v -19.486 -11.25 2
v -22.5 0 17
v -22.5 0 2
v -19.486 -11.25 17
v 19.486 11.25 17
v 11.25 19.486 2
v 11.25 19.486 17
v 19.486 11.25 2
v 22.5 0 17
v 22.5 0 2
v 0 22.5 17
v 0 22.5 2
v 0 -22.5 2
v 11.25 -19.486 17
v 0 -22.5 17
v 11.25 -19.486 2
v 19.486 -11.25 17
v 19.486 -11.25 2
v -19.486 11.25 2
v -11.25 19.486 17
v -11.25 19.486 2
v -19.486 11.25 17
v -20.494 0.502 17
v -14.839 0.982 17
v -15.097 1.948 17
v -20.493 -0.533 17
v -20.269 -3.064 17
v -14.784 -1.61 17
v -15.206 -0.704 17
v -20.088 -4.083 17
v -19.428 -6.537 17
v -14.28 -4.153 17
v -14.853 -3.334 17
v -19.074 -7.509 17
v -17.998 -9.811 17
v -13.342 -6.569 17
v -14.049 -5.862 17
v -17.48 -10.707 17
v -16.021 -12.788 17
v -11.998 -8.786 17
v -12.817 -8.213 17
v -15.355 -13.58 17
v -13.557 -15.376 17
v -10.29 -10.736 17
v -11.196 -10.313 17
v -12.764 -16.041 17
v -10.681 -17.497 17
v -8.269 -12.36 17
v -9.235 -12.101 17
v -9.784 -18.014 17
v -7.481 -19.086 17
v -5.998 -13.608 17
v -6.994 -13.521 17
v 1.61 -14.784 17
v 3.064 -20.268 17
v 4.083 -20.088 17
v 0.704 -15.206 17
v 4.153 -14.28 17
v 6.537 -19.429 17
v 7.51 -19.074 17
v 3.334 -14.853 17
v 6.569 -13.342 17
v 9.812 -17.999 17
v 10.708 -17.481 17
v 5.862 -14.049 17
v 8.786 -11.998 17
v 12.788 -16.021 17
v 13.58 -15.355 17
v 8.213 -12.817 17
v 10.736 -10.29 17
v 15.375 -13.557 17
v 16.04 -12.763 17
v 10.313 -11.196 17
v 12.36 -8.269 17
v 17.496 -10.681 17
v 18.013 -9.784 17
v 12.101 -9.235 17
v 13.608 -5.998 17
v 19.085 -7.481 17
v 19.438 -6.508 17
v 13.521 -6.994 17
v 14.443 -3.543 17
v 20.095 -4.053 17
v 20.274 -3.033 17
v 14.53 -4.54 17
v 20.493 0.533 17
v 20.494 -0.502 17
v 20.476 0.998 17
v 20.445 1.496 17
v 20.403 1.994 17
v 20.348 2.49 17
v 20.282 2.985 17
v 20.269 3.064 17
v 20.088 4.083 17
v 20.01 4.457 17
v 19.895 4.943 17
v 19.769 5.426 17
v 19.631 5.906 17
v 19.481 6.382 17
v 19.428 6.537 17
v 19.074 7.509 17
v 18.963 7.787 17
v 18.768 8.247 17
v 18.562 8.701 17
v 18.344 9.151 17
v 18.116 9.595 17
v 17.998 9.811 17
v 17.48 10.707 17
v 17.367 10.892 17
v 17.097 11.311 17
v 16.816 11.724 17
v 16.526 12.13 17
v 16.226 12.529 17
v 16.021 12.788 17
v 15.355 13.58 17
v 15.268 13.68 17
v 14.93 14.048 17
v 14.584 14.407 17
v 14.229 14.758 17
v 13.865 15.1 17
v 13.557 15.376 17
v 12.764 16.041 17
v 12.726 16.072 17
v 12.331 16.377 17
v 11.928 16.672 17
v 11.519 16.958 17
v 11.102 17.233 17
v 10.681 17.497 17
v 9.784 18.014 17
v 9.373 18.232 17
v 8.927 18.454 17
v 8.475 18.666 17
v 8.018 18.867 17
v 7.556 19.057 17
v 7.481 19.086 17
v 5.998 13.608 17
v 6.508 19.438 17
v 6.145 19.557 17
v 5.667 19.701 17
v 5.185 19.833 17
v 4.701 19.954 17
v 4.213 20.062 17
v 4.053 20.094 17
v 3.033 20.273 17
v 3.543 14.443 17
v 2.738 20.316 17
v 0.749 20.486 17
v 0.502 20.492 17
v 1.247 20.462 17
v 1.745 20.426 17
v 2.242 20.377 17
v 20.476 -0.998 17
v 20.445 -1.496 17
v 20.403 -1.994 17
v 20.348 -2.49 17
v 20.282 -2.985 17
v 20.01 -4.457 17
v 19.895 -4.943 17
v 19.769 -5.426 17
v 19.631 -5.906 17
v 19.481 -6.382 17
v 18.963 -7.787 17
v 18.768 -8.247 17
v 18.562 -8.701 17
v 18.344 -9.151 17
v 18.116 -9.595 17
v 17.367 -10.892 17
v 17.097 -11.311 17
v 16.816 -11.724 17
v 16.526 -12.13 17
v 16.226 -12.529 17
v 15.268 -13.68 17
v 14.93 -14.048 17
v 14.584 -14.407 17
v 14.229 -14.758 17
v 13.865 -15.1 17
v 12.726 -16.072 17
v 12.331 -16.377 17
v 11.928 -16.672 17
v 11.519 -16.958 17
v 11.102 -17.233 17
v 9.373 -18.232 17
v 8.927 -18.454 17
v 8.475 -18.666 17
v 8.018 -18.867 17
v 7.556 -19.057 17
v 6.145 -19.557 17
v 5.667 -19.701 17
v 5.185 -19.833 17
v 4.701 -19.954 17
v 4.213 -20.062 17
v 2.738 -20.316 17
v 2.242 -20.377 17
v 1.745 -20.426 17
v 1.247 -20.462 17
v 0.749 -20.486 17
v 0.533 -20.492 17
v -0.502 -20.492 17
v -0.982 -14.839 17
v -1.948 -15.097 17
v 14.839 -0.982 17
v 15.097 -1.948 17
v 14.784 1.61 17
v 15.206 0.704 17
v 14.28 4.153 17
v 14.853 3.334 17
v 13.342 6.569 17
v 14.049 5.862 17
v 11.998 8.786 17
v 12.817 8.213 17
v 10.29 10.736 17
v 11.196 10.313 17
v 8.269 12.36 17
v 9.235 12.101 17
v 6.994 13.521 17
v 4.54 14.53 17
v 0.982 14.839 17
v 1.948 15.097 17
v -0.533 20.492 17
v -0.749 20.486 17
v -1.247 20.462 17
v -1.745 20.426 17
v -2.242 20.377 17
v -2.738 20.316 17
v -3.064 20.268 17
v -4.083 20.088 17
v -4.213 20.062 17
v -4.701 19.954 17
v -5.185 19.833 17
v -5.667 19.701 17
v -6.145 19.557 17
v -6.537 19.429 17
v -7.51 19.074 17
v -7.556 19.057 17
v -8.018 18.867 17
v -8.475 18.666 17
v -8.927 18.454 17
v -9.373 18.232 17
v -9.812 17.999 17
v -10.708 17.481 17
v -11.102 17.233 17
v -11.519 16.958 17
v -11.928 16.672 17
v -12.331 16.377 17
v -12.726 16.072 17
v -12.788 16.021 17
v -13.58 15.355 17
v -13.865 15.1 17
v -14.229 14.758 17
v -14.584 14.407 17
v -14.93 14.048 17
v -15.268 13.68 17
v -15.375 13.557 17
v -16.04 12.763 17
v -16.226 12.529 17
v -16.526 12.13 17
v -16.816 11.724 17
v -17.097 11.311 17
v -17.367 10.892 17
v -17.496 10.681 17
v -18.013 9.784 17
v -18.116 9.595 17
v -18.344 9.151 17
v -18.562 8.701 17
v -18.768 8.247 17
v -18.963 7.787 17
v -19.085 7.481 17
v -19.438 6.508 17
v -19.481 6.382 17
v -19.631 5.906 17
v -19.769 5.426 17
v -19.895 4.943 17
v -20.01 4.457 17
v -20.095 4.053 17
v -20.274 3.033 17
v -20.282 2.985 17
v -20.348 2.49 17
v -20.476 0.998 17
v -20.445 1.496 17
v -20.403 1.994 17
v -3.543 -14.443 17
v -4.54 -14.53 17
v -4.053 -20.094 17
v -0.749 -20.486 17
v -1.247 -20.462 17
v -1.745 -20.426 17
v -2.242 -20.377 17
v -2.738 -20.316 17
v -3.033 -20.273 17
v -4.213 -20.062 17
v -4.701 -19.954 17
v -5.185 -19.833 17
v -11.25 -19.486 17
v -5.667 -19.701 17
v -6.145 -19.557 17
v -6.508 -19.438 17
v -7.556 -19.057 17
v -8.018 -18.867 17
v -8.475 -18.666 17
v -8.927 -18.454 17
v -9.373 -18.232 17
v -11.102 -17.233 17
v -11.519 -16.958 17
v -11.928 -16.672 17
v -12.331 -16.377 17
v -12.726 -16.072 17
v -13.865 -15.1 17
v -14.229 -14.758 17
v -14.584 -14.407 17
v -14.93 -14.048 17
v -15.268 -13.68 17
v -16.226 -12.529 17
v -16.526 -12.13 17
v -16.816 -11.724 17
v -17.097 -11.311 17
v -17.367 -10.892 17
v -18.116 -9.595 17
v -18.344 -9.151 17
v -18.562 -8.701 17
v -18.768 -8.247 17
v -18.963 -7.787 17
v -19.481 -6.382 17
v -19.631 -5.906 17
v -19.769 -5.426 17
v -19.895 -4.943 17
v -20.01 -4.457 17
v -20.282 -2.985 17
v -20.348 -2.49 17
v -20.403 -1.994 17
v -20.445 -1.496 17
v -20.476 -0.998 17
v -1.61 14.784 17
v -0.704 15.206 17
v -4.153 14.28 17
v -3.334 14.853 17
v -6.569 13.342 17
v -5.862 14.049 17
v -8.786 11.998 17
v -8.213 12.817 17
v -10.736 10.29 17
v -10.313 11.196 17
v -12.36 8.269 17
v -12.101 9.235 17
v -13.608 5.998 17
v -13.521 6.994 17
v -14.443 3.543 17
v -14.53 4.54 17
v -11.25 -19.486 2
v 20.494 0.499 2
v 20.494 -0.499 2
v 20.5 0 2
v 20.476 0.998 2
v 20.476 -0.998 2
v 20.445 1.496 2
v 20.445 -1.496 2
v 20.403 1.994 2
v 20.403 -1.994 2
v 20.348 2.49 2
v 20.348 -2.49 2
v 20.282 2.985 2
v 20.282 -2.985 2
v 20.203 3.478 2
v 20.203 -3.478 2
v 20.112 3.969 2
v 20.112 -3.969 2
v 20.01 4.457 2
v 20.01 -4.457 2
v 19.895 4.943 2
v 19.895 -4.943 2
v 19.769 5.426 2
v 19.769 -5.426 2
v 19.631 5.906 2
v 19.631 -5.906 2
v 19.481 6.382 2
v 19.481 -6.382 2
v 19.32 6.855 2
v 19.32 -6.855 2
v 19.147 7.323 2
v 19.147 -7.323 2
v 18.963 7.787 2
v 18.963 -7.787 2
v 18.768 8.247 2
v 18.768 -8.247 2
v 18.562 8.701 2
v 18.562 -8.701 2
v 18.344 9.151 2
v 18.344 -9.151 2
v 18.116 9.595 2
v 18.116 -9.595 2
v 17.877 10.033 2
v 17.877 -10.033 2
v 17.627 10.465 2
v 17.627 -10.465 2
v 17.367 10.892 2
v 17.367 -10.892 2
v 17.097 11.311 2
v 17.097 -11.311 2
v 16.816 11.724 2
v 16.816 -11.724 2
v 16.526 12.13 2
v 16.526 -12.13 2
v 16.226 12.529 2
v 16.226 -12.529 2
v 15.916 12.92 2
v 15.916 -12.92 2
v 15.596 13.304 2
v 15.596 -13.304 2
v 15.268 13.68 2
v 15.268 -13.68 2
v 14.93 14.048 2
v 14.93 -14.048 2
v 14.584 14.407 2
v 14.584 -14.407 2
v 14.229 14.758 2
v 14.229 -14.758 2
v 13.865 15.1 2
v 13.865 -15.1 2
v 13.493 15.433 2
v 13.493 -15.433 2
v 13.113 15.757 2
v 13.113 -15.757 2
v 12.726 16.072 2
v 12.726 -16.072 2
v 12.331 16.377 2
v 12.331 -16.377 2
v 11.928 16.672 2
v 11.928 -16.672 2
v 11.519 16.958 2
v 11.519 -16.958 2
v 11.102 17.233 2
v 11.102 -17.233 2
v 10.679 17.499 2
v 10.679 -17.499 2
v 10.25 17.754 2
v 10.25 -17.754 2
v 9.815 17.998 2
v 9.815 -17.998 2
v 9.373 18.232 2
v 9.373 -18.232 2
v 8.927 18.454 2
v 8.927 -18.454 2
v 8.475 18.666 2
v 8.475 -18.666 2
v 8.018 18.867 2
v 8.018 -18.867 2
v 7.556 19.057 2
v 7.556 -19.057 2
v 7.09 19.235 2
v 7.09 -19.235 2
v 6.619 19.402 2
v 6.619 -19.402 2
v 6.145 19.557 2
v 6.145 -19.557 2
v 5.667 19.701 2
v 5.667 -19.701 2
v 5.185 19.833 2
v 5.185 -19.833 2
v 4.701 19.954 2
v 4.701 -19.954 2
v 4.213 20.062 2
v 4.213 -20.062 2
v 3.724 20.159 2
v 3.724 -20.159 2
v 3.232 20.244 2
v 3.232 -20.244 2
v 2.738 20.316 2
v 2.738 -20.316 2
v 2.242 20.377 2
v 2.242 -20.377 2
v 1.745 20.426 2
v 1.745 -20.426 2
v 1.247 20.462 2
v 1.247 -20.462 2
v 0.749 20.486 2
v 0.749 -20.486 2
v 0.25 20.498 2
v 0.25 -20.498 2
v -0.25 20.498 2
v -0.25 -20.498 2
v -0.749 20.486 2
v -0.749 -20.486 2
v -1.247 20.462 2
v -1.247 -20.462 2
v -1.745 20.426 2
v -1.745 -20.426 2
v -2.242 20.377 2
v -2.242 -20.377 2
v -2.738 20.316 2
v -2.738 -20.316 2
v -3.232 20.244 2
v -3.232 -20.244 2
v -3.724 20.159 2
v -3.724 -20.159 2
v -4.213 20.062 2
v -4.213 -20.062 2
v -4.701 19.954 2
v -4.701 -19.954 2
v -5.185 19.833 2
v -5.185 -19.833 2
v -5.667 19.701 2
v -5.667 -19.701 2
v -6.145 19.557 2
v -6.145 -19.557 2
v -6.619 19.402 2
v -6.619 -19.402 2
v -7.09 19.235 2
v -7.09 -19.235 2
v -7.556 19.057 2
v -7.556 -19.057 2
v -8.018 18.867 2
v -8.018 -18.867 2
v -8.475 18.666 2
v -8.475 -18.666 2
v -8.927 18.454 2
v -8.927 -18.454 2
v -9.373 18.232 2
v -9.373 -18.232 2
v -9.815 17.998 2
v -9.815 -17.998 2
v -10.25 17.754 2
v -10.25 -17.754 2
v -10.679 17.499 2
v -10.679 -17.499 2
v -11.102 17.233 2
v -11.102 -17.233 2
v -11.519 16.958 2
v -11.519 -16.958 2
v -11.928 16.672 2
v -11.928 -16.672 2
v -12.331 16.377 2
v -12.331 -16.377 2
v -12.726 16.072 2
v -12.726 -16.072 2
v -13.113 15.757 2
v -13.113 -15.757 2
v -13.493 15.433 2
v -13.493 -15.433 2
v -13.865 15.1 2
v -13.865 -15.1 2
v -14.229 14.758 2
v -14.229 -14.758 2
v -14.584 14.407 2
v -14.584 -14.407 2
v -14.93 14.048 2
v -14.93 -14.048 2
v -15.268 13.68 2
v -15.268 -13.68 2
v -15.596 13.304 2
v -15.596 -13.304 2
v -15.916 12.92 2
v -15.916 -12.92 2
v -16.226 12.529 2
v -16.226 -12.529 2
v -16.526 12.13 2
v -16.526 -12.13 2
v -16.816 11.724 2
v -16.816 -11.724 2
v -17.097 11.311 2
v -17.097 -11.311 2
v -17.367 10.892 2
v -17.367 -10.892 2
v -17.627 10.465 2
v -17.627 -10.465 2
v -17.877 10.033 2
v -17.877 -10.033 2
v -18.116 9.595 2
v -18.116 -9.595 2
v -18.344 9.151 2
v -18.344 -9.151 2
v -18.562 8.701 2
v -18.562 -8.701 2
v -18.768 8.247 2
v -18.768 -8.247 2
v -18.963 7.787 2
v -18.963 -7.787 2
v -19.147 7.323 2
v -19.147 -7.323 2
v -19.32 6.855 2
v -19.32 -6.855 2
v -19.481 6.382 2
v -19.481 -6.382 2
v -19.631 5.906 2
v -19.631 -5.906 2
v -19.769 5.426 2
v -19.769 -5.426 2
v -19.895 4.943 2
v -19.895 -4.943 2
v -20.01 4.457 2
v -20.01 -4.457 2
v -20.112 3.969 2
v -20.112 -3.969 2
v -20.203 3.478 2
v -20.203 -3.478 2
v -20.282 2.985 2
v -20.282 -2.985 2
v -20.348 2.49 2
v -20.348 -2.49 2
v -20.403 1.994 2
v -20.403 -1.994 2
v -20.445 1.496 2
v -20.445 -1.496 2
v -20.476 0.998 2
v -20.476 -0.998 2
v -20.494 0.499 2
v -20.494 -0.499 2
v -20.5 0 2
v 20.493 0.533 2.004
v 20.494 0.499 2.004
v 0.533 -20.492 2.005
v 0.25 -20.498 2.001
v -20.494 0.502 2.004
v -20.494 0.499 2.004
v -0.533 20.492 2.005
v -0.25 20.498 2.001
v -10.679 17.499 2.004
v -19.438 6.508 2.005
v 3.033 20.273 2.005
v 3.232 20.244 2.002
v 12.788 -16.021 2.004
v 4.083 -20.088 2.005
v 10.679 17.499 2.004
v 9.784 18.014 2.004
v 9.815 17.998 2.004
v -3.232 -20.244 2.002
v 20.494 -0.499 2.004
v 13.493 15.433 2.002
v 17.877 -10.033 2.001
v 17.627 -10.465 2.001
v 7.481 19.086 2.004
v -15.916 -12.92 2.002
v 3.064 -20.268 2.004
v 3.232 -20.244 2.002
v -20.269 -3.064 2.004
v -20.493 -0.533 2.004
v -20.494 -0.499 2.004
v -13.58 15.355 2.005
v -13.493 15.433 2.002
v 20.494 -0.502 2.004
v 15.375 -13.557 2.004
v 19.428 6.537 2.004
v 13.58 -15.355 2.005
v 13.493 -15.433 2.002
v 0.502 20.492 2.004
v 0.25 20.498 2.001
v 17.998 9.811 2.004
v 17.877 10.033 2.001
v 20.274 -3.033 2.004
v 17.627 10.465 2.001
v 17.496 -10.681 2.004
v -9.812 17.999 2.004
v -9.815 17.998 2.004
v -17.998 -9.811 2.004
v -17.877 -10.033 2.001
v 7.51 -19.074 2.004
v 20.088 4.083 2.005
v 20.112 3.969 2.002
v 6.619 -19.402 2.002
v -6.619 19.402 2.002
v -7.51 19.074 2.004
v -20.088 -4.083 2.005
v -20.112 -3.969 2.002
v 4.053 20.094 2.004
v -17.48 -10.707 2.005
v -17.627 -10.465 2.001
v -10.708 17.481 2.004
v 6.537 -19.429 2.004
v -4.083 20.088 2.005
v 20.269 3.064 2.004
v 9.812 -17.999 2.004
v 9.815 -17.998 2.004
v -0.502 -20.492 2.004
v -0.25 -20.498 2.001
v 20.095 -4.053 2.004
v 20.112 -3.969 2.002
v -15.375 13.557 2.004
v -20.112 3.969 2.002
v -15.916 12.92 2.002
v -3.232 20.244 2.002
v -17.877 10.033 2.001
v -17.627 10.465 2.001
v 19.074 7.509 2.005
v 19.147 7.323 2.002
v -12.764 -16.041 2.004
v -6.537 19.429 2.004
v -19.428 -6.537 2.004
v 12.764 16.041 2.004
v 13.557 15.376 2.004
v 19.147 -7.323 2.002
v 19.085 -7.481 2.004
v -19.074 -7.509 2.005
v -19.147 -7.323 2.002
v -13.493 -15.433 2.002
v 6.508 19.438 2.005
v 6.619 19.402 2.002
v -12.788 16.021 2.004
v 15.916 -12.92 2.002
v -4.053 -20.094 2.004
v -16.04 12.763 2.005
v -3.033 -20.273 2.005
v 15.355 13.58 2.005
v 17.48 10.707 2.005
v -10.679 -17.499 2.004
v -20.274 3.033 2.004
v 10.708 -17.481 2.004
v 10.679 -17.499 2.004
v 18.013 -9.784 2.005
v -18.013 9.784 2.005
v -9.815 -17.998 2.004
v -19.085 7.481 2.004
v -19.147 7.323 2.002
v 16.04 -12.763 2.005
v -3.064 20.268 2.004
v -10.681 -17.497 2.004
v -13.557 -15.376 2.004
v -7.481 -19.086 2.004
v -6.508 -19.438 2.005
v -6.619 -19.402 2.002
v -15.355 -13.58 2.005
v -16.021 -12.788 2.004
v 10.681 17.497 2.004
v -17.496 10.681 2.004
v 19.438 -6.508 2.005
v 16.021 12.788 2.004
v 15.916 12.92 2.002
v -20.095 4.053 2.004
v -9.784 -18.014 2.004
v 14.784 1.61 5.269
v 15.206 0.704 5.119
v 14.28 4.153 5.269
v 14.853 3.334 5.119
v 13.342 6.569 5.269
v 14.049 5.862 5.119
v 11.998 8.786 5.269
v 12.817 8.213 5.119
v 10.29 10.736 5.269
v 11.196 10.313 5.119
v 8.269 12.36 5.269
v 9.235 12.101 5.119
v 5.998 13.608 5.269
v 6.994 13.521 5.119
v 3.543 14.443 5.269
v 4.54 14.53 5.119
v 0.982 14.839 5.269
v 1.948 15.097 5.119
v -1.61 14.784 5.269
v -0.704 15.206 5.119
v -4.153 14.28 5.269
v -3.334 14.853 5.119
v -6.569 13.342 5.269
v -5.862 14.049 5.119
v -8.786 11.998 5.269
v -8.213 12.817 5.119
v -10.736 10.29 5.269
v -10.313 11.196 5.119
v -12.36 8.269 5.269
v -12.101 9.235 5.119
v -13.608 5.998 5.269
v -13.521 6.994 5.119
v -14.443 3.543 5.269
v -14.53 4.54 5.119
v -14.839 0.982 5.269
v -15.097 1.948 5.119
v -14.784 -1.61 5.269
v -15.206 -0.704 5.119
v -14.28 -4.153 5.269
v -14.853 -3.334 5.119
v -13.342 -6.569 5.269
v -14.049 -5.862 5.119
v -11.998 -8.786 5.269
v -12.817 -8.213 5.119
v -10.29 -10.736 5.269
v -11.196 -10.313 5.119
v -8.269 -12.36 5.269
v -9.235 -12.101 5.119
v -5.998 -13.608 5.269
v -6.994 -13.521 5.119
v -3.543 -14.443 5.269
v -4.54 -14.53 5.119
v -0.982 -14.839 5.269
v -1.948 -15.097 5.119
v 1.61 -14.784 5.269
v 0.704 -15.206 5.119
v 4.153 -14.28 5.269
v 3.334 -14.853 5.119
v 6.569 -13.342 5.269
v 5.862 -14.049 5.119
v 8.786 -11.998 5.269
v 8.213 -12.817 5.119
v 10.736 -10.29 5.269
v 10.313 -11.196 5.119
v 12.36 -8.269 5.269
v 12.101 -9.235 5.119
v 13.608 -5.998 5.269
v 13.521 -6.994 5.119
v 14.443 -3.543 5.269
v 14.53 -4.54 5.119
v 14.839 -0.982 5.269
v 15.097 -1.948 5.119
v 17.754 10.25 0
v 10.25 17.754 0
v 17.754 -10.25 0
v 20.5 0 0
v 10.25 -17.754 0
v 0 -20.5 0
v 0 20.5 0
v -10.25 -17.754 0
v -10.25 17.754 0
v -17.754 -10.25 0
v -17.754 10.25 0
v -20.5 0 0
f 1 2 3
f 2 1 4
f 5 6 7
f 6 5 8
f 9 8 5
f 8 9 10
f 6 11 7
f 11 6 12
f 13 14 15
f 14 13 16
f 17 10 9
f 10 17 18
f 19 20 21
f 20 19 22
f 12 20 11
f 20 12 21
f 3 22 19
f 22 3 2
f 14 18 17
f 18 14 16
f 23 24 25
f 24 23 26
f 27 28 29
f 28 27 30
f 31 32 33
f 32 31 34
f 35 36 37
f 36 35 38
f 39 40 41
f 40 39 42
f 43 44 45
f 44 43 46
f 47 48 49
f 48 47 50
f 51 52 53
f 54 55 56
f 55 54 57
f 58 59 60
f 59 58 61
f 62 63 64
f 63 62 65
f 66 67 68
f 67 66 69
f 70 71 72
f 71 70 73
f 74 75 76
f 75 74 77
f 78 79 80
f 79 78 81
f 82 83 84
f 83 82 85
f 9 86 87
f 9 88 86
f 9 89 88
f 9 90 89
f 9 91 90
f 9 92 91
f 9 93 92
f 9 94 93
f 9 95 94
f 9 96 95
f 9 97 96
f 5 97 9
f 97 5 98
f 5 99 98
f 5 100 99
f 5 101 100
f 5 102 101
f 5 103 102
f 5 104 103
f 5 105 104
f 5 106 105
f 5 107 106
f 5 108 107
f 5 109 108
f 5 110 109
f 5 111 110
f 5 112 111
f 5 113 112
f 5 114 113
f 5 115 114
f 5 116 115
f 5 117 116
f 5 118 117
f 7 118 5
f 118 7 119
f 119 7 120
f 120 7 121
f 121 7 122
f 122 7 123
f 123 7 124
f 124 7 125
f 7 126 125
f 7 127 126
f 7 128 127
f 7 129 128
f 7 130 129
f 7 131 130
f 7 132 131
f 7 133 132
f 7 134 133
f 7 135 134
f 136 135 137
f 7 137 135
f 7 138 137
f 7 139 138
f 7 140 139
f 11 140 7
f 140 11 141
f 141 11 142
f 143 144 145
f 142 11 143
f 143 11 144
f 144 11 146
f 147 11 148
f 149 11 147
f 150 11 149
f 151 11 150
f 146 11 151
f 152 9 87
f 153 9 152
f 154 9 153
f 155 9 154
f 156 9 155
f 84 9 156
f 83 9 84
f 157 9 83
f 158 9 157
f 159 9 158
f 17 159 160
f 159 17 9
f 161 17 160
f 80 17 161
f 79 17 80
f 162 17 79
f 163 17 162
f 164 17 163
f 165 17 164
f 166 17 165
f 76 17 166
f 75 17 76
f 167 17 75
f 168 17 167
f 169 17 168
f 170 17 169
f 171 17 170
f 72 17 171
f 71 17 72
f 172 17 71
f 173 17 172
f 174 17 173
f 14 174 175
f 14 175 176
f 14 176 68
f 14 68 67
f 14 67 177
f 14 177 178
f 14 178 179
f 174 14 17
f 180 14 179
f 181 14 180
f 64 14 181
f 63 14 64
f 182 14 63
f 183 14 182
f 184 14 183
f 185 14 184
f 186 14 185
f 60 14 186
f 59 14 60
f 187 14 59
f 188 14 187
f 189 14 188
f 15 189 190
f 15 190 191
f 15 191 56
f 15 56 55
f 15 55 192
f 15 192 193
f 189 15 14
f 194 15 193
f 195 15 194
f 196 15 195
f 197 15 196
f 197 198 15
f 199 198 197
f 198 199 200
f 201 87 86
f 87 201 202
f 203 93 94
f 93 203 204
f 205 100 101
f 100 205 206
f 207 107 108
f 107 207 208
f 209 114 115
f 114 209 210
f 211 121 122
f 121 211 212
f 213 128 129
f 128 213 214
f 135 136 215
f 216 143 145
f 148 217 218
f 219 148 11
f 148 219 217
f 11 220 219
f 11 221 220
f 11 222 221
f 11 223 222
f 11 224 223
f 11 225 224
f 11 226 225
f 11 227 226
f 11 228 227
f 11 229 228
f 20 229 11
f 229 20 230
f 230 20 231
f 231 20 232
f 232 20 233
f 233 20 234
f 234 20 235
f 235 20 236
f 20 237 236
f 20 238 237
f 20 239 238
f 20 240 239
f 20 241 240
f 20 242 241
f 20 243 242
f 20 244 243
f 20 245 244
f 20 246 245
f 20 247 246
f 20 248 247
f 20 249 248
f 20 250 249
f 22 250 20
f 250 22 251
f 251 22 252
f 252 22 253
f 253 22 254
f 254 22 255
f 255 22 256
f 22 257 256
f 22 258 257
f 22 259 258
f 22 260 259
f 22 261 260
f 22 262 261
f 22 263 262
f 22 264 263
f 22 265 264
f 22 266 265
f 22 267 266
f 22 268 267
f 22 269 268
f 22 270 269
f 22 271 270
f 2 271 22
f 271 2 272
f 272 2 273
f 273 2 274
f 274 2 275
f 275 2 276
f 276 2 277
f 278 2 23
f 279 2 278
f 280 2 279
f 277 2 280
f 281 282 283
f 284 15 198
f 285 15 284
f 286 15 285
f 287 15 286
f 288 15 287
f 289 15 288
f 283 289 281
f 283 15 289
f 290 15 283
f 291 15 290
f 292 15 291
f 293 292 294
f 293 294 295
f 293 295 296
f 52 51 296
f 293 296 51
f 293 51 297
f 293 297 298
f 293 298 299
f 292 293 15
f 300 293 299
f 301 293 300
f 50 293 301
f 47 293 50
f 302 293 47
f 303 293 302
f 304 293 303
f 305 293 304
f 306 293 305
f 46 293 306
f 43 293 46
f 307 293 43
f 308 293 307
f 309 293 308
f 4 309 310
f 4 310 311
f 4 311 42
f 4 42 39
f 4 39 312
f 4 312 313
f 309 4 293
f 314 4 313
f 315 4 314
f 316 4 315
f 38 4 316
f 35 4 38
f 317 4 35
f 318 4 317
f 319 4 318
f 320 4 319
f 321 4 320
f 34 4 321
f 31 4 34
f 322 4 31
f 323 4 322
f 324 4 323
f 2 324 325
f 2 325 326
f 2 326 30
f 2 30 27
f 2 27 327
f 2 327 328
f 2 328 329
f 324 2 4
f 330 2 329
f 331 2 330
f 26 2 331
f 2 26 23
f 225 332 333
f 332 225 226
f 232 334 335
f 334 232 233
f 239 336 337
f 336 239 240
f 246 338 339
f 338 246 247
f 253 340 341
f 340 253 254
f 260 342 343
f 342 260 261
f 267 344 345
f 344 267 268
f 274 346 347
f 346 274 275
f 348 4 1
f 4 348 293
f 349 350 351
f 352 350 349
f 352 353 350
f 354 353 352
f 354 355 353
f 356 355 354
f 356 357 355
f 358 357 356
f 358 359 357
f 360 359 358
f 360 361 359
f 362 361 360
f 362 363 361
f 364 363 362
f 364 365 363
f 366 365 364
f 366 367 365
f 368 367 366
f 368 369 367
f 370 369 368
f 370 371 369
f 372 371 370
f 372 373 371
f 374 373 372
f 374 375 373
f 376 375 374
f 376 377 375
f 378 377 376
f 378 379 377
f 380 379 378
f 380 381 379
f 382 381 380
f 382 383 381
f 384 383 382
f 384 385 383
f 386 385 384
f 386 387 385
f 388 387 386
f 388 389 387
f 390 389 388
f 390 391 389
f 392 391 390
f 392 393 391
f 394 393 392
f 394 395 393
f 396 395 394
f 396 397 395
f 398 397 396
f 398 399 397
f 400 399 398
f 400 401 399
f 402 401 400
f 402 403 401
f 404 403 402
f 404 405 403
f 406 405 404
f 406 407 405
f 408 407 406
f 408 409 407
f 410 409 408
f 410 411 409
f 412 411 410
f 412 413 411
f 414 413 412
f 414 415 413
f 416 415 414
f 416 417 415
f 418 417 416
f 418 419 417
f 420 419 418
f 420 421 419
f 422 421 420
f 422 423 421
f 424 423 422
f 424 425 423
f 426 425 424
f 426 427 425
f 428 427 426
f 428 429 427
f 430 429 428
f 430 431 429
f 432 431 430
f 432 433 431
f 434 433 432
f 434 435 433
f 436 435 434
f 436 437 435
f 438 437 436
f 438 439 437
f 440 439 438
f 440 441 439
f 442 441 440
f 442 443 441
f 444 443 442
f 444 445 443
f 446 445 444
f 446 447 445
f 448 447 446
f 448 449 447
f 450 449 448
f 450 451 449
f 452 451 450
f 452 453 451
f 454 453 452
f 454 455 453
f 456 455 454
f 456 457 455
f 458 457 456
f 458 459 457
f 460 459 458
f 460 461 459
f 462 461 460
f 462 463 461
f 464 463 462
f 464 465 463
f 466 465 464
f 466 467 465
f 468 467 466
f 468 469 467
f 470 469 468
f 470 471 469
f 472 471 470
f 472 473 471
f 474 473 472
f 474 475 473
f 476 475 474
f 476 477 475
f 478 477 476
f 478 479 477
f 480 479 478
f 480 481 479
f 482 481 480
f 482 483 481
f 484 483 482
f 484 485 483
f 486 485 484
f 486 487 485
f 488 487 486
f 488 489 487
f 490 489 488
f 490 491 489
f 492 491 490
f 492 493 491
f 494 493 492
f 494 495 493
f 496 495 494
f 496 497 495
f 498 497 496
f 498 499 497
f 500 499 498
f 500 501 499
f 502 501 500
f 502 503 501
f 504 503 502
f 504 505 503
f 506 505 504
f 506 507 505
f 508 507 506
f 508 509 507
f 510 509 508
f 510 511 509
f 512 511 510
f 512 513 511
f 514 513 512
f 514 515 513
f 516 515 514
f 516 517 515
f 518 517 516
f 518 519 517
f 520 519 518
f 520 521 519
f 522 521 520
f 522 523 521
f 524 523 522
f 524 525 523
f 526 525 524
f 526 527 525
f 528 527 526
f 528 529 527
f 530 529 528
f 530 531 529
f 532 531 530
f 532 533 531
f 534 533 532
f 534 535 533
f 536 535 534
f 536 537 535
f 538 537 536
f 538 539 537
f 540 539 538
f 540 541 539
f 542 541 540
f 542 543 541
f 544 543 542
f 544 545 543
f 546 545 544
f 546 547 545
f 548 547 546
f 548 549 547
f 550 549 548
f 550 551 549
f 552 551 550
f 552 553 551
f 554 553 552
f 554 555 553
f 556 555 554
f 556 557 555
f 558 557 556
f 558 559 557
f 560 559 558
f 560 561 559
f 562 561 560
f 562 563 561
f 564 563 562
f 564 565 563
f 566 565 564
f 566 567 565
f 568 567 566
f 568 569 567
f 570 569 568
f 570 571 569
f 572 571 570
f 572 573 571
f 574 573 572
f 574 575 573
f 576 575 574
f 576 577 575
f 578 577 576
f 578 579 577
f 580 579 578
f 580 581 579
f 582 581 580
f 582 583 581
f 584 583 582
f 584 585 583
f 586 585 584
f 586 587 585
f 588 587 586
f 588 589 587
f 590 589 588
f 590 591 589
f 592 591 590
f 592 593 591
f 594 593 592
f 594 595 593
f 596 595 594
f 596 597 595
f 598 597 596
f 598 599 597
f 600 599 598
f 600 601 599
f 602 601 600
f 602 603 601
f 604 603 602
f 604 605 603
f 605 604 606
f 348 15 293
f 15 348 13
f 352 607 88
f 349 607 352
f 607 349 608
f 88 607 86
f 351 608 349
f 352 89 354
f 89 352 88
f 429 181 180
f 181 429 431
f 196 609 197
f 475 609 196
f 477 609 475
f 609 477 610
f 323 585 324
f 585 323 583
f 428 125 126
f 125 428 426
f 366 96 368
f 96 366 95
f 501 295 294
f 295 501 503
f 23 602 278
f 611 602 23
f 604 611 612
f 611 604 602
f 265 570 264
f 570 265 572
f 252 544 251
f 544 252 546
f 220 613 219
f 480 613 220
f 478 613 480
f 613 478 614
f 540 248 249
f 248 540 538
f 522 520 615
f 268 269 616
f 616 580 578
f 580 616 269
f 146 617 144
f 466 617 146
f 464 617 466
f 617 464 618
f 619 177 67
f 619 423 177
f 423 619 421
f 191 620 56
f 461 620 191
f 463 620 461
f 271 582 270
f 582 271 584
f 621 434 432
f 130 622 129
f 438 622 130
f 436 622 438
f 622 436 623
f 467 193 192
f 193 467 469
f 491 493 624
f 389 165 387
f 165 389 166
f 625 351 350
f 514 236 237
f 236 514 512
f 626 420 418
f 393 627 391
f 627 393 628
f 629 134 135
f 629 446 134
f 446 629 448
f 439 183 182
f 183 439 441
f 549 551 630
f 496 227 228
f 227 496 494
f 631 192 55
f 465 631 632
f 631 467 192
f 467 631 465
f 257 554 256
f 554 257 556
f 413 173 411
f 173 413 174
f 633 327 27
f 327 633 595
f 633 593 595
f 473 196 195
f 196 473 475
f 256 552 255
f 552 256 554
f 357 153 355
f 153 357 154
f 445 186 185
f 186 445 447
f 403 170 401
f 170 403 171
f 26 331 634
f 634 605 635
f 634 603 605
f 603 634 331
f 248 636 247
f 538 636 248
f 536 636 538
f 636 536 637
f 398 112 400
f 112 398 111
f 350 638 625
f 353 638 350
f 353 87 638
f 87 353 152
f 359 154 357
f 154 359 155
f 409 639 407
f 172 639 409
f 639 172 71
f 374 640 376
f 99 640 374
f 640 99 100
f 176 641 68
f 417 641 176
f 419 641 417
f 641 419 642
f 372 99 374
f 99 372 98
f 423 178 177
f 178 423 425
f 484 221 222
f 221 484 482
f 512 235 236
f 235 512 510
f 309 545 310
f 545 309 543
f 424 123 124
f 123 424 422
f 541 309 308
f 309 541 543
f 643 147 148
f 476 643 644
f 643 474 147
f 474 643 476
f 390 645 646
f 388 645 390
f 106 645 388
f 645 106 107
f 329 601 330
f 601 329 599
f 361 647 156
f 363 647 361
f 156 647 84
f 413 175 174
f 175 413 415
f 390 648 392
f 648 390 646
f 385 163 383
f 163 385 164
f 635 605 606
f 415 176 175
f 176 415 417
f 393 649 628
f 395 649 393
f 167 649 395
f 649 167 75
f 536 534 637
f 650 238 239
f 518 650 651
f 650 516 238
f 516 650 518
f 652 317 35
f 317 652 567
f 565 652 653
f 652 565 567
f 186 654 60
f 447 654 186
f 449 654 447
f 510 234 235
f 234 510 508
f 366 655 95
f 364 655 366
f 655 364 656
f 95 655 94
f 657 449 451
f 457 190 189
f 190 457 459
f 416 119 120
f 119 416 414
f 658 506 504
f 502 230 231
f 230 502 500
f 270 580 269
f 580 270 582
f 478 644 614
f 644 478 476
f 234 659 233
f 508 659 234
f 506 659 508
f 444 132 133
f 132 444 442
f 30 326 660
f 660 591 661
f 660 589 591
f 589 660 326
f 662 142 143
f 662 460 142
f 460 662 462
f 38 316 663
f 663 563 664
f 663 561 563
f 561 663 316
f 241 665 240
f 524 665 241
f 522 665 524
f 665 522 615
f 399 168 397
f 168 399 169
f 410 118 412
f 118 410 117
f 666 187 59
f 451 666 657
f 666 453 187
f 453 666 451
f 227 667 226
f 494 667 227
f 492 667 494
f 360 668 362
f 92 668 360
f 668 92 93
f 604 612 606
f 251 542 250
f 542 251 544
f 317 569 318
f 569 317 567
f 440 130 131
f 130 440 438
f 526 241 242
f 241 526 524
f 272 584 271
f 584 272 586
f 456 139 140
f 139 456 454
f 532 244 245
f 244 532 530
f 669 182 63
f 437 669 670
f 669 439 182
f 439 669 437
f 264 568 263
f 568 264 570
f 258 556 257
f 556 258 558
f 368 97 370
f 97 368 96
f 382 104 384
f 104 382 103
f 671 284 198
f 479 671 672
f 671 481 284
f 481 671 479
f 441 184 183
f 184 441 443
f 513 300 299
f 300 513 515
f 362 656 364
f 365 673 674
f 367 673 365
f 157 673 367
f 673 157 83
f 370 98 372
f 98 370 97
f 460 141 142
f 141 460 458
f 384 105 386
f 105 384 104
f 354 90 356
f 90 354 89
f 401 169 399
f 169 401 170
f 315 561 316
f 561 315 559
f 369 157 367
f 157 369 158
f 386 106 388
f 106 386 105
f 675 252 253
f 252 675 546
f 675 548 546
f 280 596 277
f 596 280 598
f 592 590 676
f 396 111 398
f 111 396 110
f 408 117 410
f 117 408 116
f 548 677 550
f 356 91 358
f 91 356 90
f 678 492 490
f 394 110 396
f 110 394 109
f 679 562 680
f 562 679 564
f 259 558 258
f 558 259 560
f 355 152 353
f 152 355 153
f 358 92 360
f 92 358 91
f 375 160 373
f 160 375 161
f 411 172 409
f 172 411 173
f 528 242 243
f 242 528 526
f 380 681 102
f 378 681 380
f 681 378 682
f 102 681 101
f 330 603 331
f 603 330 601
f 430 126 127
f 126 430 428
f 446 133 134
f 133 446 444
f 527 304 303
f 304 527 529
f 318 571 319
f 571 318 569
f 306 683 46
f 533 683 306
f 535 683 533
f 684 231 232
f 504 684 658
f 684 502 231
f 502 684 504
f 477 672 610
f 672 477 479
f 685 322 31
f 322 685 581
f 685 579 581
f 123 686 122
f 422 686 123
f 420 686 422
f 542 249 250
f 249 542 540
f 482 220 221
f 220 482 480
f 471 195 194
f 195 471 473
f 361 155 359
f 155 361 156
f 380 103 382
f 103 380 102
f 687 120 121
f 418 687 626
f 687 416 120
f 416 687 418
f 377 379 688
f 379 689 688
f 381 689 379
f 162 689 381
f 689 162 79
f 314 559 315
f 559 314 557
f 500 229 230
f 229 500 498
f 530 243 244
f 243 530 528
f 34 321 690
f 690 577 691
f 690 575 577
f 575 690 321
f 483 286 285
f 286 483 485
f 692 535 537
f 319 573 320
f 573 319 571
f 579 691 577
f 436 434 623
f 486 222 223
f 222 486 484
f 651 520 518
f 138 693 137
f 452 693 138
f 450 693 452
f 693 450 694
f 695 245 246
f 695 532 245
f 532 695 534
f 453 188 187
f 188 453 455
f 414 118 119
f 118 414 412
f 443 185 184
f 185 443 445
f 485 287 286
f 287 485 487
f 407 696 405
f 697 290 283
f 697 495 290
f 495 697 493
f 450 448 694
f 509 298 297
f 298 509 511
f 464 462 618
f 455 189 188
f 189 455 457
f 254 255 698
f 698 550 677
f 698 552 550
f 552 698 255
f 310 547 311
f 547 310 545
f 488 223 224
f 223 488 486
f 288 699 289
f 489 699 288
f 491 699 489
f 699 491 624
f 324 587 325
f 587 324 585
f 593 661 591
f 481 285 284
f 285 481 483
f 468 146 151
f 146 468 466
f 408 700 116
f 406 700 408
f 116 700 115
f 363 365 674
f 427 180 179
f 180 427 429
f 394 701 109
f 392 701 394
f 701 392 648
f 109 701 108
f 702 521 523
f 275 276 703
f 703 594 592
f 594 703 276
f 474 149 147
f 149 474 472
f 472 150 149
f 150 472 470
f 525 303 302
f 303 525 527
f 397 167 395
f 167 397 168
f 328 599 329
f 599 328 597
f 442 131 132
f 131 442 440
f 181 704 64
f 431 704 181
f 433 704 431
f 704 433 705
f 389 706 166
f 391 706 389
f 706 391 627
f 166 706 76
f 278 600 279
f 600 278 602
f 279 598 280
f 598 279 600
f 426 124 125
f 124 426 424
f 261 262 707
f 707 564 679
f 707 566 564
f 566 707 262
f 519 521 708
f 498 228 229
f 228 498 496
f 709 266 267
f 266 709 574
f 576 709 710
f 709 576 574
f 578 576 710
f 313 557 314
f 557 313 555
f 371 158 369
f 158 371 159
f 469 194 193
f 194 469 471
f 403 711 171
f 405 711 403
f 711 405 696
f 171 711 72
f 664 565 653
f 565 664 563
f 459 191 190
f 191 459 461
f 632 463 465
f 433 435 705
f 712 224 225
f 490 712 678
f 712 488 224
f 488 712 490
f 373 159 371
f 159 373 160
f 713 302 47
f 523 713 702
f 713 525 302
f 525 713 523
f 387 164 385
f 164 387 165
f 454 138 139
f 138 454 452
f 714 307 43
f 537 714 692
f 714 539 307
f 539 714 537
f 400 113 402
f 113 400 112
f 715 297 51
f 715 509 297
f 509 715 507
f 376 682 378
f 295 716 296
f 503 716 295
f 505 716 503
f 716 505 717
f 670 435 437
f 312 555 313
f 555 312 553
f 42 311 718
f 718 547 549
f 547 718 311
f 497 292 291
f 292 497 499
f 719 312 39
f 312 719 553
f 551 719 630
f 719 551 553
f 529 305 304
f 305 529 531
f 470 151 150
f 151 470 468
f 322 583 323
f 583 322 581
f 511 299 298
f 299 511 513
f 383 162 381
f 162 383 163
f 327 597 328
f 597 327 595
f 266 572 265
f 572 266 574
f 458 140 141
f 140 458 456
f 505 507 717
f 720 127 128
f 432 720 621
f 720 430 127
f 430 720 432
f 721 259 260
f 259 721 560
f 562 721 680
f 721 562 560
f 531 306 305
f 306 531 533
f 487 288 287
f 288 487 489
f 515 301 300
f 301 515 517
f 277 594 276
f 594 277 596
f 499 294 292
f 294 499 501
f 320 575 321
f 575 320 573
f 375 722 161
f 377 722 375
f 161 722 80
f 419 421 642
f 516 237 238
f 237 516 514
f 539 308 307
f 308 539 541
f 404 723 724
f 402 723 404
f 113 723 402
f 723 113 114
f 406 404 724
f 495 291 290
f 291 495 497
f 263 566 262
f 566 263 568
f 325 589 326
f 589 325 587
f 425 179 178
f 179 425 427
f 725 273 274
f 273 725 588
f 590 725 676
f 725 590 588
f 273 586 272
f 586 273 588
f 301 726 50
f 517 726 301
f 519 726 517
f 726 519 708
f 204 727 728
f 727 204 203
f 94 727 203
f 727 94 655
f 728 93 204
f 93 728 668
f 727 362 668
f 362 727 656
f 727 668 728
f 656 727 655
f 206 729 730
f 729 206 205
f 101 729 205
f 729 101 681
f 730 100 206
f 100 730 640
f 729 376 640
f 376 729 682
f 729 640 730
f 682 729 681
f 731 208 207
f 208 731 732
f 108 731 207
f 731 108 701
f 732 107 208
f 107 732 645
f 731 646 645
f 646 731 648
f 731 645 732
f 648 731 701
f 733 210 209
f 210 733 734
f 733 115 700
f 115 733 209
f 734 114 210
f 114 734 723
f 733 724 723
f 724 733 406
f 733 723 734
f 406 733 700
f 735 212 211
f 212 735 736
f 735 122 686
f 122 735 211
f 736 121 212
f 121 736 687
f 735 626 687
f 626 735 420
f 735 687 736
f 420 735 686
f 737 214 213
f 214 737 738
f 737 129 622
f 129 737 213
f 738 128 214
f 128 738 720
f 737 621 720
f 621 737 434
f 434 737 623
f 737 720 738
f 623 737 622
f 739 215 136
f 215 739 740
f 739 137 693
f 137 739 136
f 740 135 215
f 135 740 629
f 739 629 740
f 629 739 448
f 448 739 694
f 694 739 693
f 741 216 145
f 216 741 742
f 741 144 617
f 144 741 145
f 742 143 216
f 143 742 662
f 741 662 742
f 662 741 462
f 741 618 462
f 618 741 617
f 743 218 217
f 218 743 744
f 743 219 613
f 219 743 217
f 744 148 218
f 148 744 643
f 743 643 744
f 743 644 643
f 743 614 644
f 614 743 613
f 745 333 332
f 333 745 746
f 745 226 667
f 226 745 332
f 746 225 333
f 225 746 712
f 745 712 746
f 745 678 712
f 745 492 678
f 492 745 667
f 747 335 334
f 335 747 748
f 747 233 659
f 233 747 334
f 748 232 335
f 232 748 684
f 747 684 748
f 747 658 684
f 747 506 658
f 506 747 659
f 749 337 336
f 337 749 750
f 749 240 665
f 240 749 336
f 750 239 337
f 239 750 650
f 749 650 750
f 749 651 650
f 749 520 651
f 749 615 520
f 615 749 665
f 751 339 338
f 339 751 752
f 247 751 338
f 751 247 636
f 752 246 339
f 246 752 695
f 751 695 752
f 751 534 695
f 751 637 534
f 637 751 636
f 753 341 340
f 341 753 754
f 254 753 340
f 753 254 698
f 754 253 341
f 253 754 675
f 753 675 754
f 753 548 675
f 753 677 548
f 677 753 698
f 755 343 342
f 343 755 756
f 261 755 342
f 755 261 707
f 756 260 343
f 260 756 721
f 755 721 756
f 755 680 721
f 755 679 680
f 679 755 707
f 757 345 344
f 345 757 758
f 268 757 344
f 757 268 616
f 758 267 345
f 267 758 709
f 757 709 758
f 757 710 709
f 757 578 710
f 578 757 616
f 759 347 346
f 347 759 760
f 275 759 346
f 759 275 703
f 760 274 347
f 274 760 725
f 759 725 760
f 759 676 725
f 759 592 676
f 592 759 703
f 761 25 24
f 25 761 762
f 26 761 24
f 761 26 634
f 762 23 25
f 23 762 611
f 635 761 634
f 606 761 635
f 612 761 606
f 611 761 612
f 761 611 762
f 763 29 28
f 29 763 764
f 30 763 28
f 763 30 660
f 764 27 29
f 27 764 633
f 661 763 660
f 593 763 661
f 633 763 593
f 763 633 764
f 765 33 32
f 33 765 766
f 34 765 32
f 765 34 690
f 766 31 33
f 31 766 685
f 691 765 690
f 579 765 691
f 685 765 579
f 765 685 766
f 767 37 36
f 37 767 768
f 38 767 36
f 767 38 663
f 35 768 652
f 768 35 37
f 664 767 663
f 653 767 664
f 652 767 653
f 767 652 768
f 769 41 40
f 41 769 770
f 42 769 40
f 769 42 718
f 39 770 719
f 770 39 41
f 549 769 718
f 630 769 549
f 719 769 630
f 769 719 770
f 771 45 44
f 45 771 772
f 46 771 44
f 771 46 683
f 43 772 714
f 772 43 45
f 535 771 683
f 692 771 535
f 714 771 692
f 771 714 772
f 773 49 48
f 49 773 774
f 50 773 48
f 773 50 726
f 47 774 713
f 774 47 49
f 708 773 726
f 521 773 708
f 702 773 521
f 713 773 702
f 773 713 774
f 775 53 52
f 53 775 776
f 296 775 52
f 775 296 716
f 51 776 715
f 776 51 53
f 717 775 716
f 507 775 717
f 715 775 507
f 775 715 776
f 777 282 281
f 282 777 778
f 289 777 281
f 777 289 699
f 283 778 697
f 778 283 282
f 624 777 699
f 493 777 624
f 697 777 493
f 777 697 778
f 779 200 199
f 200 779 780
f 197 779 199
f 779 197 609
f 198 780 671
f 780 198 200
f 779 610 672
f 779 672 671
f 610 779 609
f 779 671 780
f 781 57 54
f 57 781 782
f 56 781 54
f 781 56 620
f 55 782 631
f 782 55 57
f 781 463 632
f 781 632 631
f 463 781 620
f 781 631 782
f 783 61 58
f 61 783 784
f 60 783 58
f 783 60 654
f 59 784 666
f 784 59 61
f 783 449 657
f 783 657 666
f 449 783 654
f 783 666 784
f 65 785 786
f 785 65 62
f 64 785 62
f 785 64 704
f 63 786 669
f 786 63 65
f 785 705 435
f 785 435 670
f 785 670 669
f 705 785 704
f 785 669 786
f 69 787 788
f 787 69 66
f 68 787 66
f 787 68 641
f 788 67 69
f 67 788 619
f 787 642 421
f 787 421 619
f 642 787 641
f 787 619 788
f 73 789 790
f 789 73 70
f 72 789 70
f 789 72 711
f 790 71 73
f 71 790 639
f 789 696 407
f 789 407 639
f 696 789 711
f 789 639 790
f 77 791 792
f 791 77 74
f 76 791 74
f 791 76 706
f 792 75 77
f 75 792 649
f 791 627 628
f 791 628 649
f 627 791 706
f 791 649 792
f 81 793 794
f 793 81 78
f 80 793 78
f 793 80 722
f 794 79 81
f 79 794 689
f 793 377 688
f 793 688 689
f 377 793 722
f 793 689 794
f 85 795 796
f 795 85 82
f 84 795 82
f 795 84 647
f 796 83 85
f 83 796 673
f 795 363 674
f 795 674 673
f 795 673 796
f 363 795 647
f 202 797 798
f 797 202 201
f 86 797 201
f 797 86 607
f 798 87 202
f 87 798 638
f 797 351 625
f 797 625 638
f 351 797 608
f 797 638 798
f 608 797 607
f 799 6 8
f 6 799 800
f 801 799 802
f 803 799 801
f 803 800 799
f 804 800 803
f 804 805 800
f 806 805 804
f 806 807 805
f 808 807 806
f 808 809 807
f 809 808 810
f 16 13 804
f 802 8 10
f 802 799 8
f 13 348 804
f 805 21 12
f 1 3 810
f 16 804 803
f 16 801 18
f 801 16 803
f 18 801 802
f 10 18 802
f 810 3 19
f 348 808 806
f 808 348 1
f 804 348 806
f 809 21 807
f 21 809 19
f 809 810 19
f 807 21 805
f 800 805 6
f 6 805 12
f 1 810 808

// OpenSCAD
//parametric soda bottle opener
//John Finch 12/3/13
//Added chamfer to top of cap 12/3/13


cap_dia = 30.5;
cap_height = 15;
interference = .01;  //fraction the spine protruding into cap diameter

outer_dia = 45;
inner_dia = cap_dia * (1-interference);
wall_thickness = 2;
spine_angle = 15;
spine_thickness = 1;
num_spines = 36;

spine_length = (outer_dia/2-wall_thickness-inner_dia/2)/cos(spine_angle);

fa=0.01;
fs=0.5;

module spine(){
//echo(outer_dia/2-wall_thickness-spine_length);
//echo(-spine_thickness/2);
difference(){
	translate ([outer_dia/2-wall_thickness-spine_length*cos(spine_angle),-spine_thickness/2-spine_length*sin(spine_angle),0])
	rotate([0,0,spine_angle])
	cube([spine_length+.5,spine_thickness,cap_height]);
	
	translate([outer_dia/2-wall_thickness-spine_length,spine_length/2,0])
	rotate([90,0,0])
	cylinder(h=spine_length,r1=spine_length, r2=spine_length,$fn=3);
}
}


translate([0,0,2])
difference(){
	cylinder(h = cap_height, r1 = outer_dia/2, r2 = outer_dia/2, $fn=12);
	cylinder(h = cap_height, r1 = outer_dia/2-wall_thickness, r2 = outer_dia/2-wall_thickness, $fa=fa, $fs=fs);

	}
rot_angle = 360/num_spines;
translate([0,0,2])
for ( i = [ 1 : num_spines ] )
	{
	rotate([0,0,i*rot_angle])
	spine();
	}

translate([0,0,0])
cylinder(h = 2, r1 = outer_dia/2-2, r2 = outer_dia/2, $fn=12);

//spine();
